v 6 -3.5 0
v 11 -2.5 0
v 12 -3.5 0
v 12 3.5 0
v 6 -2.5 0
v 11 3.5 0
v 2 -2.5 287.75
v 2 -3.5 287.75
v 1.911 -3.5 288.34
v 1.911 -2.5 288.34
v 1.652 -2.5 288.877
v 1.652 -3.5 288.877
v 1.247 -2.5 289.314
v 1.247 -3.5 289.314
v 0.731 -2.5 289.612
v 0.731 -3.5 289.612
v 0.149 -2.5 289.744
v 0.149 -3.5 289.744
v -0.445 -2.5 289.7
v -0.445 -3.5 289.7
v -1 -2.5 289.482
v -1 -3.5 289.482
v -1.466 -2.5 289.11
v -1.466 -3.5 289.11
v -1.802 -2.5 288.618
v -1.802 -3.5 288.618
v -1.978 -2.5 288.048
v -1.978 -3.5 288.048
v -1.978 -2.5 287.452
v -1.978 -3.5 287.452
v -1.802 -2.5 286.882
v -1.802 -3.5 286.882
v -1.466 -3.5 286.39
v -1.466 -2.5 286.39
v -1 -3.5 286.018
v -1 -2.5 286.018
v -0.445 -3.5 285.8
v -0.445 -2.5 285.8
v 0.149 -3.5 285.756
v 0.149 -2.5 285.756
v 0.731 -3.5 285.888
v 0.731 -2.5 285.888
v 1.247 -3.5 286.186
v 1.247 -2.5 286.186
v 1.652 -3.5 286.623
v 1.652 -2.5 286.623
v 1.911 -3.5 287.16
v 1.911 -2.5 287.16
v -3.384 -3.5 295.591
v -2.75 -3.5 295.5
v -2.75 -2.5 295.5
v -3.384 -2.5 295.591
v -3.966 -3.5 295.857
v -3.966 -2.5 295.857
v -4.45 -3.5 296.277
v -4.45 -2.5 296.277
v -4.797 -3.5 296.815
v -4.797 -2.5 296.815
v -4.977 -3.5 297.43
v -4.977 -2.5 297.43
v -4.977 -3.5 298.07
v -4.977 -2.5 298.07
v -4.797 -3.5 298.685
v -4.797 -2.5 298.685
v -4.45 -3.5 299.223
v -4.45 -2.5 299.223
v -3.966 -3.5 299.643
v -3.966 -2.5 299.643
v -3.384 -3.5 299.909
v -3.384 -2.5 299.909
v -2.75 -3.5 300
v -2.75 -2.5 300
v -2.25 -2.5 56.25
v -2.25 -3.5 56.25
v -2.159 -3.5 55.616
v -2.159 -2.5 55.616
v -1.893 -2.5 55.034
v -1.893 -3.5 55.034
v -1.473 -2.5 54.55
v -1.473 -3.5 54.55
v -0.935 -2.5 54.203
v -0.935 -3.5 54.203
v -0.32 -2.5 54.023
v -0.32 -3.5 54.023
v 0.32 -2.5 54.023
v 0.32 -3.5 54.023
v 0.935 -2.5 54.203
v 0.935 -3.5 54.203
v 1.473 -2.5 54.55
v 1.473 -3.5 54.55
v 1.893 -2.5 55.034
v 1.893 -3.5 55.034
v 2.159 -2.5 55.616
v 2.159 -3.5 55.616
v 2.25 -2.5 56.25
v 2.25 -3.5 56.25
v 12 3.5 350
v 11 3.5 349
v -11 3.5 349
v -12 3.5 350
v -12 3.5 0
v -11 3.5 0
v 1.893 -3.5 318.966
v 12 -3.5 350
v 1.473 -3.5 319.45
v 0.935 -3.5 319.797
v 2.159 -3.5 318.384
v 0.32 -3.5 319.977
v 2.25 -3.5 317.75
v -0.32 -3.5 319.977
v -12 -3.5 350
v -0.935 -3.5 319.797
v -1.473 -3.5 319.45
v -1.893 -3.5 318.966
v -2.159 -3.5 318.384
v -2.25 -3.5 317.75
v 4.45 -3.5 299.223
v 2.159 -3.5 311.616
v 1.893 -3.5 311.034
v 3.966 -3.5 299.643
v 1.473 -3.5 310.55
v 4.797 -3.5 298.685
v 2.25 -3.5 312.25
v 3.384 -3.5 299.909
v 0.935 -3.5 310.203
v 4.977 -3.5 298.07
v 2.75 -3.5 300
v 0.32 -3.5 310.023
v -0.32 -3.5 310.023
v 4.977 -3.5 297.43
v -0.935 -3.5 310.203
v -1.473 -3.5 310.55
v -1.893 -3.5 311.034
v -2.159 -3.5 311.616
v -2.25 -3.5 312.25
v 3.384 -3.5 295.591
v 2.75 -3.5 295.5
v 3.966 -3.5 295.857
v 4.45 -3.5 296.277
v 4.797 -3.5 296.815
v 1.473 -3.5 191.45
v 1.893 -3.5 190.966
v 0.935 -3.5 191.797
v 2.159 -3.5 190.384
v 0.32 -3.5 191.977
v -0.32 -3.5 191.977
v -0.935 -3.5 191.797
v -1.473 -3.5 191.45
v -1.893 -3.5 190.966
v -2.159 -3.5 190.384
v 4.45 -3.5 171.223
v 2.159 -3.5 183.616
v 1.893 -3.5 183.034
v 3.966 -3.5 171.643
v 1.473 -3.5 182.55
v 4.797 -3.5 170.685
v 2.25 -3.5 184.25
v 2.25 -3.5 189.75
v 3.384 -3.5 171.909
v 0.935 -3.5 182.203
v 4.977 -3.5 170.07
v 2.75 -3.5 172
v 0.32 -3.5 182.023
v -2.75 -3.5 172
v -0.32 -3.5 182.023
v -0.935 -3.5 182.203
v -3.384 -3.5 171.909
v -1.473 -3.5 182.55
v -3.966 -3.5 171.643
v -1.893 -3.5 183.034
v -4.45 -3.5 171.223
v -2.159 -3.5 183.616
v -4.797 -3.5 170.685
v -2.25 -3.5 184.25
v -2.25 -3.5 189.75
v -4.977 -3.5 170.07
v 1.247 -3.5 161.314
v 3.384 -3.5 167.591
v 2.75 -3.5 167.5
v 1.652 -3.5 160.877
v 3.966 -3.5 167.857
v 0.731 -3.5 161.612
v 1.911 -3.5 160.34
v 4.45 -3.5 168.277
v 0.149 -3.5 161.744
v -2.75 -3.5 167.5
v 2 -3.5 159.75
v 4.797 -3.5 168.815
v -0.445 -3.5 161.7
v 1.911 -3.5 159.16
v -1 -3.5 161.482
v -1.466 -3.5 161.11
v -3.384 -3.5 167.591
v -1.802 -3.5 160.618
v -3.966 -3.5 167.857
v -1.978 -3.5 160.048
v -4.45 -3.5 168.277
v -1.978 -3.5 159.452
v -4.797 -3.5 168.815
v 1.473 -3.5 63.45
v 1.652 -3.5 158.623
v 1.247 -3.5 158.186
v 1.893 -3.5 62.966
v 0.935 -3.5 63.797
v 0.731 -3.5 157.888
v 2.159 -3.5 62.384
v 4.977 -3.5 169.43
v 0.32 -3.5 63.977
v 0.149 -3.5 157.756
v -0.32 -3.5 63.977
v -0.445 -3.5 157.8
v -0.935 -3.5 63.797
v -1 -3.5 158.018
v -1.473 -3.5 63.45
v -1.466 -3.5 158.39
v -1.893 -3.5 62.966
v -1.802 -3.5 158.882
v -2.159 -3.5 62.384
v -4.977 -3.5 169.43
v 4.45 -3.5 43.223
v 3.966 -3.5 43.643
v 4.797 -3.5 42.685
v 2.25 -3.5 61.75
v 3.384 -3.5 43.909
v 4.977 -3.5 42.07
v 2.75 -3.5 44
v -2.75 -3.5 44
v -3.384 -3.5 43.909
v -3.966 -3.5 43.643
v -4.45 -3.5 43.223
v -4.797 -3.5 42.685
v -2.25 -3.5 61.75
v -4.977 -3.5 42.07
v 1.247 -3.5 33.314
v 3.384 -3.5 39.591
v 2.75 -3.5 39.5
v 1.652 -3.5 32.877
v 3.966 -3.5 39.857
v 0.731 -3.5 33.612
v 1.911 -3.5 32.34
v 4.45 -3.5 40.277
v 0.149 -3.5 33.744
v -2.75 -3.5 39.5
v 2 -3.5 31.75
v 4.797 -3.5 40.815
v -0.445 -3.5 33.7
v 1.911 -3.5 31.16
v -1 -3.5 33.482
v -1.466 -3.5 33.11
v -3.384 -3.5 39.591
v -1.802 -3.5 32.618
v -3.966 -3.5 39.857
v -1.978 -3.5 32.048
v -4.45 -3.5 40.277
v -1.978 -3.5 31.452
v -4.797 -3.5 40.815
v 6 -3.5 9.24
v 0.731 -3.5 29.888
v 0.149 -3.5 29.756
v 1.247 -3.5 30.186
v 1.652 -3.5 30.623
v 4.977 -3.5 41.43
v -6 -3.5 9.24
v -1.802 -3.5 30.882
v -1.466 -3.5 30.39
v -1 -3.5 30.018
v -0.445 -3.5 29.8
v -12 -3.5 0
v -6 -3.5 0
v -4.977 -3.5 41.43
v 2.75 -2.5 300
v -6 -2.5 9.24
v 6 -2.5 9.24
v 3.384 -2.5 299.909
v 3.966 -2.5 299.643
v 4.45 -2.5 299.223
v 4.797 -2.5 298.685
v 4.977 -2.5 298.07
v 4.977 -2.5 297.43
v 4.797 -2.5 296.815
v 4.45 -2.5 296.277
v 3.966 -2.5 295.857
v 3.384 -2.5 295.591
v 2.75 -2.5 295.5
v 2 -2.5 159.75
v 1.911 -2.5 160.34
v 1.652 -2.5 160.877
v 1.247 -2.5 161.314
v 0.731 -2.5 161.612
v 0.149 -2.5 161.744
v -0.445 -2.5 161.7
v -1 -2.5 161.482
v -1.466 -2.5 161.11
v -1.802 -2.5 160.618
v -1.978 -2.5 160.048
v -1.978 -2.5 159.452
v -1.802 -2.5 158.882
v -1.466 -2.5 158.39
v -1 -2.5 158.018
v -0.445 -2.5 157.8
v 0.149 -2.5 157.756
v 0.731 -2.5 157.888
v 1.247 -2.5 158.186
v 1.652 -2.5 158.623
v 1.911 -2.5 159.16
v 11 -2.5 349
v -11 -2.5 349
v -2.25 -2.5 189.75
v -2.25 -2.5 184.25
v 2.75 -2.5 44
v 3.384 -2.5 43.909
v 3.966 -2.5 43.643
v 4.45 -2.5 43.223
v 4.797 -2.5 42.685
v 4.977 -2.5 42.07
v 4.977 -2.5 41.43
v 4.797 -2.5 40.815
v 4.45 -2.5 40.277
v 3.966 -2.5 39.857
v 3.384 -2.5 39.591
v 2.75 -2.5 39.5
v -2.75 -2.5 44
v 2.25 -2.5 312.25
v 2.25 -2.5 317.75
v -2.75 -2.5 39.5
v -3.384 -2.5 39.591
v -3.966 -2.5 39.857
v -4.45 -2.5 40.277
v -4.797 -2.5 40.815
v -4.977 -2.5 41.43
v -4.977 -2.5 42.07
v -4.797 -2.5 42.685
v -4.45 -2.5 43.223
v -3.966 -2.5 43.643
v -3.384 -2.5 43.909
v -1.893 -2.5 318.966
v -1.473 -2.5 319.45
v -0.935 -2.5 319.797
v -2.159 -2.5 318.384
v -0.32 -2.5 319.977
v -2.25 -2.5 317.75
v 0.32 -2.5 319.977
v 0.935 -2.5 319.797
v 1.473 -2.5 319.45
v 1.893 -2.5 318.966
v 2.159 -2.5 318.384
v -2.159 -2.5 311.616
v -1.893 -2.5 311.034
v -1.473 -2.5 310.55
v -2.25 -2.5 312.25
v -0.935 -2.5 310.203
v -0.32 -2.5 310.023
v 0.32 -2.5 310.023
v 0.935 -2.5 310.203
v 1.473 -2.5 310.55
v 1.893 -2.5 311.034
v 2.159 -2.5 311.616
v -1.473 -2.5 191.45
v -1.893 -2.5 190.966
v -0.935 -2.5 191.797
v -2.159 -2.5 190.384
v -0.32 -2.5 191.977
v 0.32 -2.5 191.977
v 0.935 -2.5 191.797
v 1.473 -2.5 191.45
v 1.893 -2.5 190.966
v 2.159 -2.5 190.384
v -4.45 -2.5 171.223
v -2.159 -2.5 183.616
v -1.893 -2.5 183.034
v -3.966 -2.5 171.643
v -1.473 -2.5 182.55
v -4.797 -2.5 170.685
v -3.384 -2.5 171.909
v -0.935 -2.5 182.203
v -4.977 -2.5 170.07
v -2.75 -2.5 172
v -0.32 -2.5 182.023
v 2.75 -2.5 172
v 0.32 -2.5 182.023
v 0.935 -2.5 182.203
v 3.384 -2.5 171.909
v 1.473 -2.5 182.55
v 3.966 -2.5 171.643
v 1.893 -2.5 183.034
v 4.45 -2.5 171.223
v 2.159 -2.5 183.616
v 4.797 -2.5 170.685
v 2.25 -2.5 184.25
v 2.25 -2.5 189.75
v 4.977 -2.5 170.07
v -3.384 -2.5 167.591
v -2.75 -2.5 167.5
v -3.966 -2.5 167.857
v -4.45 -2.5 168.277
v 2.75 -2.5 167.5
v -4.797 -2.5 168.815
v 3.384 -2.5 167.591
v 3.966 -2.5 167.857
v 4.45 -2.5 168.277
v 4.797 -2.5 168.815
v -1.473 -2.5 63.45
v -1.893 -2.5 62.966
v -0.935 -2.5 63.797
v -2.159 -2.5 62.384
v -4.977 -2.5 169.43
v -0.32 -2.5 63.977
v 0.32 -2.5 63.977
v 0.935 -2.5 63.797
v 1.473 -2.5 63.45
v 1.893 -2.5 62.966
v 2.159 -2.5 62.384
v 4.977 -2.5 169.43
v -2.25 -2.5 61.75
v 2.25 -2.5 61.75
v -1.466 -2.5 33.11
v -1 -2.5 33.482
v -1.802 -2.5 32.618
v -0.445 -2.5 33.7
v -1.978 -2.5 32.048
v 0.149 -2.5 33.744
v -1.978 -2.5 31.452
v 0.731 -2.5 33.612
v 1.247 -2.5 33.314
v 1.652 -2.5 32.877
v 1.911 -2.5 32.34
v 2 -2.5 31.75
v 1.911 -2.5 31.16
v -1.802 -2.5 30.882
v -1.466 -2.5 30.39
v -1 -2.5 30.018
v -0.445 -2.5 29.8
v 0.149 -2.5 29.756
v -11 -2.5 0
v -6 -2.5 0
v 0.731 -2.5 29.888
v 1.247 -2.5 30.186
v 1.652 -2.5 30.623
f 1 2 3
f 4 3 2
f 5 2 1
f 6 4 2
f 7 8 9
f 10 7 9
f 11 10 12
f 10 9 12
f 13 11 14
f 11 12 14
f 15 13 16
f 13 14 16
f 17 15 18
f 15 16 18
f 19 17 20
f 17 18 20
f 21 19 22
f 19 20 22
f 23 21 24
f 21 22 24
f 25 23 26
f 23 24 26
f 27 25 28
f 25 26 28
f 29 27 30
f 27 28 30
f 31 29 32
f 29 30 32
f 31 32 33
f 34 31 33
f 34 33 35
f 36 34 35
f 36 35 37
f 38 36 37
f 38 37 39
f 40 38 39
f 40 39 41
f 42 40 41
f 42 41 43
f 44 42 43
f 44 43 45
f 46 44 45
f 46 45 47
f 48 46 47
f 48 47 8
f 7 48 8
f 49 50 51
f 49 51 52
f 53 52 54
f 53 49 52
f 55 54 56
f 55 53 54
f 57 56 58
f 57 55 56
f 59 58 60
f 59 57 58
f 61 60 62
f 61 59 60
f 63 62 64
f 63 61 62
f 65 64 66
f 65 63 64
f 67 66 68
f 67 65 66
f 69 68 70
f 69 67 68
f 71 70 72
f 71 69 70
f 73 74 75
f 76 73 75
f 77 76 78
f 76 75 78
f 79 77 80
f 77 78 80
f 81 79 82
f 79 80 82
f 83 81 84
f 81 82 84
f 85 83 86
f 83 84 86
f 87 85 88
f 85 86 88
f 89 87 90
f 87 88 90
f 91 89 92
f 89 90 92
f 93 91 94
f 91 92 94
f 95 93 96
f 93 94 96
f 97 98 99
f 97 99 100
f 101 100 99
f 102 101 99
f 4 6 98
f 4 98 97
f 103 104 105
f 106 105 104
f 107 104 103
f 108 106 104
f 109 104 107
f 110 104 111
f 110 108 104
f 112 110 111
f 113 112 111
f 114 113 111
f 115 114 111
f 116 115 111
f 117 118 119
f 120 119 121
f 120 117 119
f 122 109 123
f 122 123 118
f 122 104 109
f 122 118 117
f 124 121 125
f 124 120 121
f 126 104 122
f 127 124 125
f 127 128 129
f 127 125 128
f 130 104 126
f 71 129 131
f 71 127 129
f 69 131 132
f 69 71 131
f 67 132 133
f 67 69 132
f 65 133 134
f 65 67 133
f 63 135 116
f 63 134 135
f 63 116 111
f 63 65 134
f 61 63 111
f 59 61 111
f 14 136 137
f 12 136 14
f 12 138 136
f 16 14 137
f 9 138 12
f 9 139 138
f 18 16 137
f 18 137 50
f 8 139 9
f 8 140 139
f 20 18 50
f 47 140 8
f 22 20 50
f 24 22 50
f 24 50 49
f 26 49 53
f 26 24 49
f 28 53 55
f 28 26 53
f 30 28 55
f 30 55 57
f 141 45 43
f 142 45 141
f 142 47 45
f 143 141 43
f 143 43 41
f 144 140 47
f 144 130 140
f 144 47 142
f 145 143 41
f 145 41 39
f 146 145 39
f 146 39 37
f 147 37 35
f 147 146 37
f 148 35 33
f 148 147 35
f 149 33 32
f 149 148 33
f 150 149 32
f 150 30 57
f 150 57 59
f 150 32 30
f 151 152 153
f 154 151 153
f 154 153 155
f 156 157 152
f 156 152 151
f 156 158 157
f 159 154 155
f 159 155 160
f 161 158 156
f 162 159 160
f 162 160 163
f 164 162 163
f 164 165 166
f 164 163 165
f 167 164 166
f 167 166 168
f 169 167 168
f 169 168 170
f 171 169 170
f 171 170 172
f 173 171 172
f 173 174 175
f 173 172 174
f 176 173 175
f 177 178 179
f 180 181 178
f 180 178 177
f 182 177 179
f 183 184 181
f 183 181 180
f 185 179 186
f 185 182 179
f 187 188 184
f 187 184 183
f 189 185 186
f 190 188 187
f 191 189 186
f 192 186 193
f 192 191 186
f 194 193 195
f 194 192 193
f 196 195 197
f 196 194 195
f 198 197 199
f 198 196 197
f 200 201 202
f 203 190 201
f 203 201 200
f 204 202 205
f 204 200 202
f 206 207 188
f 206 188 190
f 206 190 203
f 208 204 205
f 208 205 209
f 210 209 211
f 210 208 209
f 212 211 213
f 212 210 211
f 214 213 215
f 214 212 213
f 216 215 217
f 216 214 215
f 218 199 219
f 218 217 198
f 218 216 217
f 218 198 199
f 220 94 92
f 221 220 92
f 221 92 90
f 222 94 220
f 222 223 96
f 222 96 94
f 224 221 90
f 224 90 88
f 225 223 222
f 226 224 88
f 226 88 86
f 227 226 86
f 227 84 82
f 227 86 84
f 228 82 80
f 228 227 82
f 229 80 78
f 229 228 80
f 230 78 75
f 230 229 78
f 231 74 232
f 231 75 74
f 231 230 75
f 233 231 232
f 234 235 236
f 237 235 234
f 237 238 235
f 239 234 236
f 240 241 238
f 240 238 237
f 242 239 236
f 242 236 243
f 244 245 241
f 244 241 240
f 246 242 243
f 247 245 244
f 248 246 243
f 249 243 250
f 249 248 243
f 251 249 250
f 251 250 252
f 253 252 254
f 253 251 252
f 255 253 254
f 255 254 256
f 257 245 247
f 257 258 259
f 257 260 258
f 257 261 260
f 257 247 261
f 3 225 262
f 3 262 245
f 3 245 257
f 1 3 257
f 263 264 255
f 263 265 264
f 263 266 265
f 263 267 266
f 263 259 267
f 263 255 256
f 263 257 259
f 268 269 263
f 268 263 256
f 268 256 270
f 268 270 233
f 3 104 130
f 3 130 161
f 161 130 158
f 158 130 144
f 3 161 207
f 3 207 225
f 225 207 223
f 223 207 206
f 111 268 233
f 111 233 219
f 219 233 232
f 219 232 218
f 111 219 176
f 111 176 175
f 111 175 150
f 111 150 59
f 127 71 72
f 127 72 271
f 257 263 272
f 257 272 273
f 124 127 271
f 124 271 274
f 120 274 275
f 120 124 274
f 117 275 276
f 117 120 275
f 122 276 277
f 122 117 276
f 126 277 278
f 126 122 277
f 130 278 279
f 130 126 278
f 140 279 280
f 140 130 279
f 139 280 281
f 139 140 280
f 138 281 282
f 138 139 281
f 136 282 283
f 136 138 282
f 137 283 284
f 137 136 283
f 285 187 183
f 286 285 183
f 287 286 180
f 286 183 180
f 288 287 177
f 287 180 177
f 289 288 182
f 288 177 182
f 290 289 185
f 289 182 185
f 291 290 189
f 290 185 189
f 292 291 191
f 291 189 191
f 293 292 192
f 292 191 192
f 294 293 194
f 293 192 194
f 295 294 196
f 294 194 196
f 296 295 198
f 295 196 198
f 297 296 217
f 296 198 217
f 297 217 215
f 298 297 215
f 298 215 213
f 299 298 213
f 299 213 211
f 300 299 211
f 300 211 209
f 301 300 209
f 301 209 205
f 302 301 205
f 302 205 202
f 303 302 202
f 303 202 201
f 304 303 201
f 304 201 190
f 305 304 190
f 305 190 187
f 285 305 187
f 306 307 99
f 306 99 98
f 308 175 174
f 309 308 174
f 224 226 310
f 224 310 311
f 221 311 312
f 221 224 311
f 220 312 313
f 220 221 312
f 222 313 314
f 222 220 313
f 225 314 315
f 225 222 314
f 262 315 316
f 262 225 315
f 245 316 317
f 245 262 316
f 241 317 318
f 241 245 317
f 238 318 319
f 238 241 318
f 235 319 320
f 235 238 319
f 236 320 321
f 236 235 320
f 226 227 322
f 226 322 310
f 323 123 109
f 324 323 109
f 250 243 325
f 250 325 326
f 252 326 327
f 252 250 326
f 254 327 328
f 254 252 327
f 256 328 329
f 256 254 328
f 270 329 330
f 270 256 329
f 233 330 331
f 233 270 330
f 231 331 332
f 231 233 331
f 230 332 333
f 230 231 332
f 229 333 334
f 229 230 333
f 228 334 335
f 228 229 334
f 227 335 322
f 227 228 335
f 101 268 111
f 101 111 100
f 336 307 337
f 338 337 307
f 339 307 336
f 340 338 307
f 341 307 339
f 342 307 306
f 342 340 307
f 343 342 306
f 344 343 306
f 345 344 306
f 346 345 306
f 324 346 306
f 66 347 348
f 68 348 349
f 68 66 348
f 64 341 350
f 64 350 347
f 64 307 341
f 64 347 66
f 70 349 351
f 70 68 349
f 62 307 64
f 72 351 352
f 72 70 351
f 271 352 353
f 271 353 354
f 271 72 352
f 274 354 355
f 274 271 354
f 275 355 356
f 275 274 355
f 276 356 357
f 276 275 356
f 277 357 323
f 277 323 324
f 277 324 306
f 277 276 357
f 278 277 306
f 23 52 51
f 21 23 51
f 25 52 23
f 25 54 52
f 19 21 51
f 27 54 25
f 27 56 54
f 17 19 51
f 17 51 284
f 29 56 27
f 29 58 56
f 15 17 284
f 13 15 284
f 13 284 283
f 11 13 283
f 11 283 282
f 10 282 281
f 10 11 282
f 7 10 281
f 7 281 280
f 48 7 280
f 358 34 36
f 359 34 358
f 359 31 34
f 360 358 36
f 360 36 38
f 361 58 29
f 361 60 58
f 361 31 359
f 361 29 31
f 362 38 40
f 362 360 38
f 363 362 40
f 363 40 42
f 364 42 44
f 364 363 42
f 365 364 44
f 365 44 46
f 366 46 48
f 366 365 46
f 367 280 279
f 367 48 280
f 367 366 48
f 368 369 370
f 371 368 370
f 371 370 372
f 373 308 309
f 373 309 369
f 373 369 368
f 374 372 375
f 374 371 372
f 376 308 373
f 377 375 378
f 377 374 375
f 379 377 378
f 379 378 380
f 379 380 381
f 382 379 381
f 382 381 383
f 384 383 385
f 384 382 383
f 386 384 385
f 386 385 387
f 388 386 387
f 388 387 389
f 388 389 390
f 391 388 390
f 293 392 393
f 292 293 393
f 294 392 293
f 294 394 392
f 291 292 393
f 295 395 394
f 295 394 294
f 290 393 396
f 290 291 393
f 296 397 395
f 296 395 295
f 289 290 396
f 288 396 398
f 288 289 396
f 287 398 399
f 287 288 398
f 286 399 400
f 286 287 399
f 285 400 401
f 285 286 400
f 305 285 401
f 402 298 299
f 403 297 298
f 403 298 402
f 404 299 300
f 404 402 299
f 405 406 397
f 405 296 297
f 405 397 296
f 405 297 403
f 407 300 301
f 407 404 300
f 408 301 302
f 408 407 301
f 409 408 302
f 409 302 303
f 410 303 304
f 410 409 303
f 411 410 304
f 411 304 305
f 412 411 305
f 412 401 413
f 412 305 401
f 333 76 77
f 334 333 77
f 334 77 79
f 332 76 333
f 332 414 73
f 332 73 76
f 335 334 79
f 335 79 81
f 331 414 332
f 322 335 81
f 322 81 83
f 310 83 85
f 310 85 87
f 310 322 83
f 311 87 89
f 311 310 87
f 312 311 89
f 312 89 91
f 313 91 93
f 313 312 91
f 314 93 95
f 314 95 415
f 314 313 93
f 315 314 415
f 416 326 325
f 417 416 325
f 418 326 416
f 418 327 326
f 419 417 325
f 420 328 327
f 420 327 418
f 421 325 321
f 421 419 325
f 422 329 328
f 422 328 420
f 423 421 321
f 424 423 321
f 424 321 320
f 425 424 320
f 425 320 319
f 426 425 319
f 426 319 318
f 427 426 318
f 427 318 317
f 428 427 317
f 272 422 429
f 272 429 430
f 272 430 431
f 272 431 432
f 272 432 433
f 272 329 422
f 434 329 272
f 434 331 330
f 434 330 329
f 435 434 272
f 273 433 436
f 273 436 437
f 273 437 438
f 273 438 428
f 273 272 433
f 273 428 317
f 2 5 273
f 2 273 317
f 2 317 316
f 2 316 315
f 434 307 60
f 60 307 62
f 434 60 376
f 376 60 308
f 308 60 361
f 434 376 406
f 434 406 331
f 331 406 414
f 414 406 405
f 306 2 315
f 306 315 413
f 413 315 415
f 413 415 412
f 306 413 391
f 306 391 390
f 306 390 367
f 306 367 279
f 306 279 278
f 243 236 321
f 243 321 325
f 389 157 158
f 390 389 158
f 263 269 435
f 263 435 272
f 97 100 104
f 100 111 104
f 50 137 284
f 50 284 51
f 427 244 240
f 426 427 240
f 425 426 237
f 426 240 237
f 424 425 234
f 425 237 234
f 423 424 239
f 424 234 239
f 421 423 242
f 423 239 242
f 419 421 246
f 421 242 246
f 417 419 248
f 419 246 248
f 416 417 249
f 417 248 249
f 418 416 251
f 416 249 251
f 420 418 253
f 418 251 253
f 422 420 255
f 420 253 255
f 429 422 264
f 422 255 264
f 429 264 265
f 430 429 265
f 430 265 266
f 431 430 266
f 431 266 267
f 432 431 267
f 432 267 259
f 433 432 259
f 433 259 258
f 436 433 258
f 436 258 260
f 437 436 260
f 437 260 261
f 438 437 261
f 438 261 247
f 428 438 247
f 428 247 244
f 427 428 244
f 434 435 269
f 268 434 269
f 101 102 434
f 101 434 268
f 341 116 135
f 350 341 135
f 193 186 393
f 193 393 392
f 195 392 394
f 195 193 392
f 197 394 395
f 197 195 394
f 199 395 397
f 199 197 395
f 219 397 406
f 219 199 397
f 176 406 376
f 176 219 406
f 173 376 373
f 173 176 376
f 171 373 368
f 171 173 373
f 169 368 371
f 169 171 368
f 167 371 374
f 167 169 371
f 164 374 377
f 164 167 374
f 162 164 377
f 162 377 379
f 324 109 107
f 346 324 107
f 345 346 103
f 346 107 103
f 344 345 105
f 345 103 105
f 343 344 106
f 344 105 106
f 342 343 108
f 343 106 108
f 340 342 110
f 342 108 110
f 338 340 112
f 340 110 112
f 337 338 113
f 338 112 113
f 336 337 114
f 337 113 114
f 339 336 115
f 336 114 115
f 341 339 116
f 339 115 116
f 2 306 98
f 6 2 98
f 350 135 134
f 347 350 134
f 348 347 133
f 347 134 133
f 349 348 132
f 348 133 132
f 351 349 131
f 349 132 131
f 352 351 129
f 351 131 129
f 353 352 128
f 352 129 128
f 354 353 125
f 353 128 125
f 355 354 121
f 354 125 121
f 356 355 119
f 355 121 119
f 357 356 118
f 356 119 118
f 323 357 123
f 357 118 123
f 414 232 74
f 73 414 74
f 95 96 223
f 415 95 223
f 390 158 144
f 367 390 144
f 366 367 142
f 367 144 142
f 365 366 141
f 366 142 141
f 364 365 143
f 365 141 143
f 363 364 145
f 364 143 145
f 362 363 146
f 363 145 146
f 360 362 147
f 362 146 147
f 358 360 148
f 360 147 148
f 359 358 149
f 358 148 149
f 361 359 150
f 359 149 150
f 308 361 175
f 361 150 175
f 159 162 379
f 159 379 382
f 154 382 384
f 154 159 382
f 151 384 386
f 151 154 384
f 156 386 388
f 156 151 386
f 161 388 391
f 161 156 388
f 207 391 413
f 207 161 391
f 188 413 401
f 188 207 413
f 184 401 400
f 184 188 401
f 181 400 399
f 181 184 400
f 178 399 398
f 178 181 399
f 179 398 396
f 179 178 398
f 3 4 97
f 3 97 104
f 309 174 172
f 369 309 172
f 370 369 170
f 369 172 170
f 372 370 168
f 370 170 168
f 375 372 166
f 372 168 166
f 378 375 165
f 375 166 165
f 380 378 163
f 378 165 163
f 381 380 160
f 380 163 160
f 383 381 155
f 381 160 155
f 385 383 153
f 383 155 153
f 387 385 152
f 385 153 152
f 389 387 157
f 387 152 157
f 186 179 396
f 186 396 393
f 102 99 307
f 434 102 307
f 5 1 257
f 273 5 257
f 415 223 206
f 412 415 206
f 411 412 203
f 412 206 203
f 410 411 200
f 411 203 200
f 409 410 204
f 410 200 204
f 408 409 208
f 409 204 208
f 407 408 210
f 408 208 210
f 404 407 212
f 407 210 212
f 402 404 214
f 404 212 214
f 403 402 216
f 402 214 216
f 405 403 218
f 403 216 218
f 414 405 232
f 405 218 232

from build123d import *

# Parameters (mm, degrees)
EXTRUDE_1_DEPTH     = 350
SKETCH_2_R          = 2
SKETCH_2_W          = 12
SKETCH_2_H          = 9.239849372
CUT_EXTRUDE_1_DEPTH = 3500
SKETCH_3_W          = 22
SKETCH_3_H          = 1
EXTRUDE_2_DEPTH     = 6


with BuildPart() as part:
    # 草图1 → 凸台-拉伸1 (new body)
    with BuildSketch(Plane.XY):
        Polygon((-12, 3.5), (-11, 3.5), (-11, -2.5), (11, -2.5), (11, 3.5), (12, 3.5), (12, -3.5), (-12, -3.5), align=None)
    extrude(amount=EXTRUDE_1_DEPTH)

    # 草图2 → 切除-拉伸1 (cut)
    with BuildSketch(Plane.XZ.offset(3.5)):
        with Locations((0, 287.75)):
            Circle(SKETCH_2_R)
        with Locations((0, 159.75)):
            Circle(SKETCH_2_R)
        with Locations((0, 31.75)):
            Circle(SKETCH_2_R)
        with BuildLine():
            Line((-2.75, 300), (2.75, 300))
            ThreePointArc((2.75, 300), (5, 297.75), (2.75, 295.5))
            Line((2.75, 295.5), (-2.75, 295.5))
            ThreePointArc((-2.75, 295.5), (-5, 297.75), (-2.75, 300))
        make_face()
        with BuildLine():
            Line((-2.25, 317.75), (-2.25, 312.25))
            ThreePointArc((-2.25, 312.25), (0, 310), (2.25, 312.25))
            Line((2.25, 312.25), (2.25, 317.75))
            ThreePointArc((2.25, 317.75), (0, 320), (-2.25, 317.75))
        make_face()
        with BuildLine():
            Line((-2.25, 189.75), (-2.25, 184.25))
            ThreePointArc((-2.25, 184.25), (0, 182), (2.25, 184.25))
            Line((2.25, 184.25), (2.25, 189.75))
            ThreePointArc((2.25, 189.75), (0, 192), (-2.25, 189.75))
        make_face()
        with BuildLine():
            Line((2.75, 167.5), (-2.75, 167.5))
            ThreePointArc((-2.75, 167.5), (-5, 169.75), (-2.75, 172))
            Line((-2.75, 172), (2.75, 172))
            ThreePointArc((2.75, 172), (5, 169.75), (2.75, 167.5))
        make_face()
        with BuildLine():
            Line((-2.25, 61.75), (-2.25, 56.25))
            ThreePointArc((-2.25, 56.25), (0, 54), (2.25, 56.25))
            Line((2.25, 56.25), (2.25, 61.75))
            ThreePointArc((2.25, 61.75), (0, 64), (-2.25, 61.75))
        make_face()
        with BuildLine():
            Line((2.75, 39.5), (-2.75, 39.5))
            ThreePointArc((-2.75, 39.5), (-5, 41.75), (-2.75, 44))
            Line((-2.75, 44), (2.75, 44))
            ThreePointArc((2.75, 44), (5, 41.75), (2.75, 39.5))
        make_face()
        with Locations((0, 4.619924686)):
            Rectangle(SKETCH_2_W, SKETCH_2_H)
    extrude(amount=-CUT_EXTRUDE_1_DEPTH, mode=Mode.SUBTRACT)

    # 草图3 → 凸台-拉伸2 (add)
    with BuildSketch(Plane(origin=(0, -2.5, 0), x_dir=(1, 0, 0), z_dir=(0, 1, 0))):
        with Locations((0, -349.5)):
            Rectangle(SKETCH_3_W, SKETCH_3_H)
    extrude(amount=EXTRUDE_2_DEPTH)


solid = part.part
